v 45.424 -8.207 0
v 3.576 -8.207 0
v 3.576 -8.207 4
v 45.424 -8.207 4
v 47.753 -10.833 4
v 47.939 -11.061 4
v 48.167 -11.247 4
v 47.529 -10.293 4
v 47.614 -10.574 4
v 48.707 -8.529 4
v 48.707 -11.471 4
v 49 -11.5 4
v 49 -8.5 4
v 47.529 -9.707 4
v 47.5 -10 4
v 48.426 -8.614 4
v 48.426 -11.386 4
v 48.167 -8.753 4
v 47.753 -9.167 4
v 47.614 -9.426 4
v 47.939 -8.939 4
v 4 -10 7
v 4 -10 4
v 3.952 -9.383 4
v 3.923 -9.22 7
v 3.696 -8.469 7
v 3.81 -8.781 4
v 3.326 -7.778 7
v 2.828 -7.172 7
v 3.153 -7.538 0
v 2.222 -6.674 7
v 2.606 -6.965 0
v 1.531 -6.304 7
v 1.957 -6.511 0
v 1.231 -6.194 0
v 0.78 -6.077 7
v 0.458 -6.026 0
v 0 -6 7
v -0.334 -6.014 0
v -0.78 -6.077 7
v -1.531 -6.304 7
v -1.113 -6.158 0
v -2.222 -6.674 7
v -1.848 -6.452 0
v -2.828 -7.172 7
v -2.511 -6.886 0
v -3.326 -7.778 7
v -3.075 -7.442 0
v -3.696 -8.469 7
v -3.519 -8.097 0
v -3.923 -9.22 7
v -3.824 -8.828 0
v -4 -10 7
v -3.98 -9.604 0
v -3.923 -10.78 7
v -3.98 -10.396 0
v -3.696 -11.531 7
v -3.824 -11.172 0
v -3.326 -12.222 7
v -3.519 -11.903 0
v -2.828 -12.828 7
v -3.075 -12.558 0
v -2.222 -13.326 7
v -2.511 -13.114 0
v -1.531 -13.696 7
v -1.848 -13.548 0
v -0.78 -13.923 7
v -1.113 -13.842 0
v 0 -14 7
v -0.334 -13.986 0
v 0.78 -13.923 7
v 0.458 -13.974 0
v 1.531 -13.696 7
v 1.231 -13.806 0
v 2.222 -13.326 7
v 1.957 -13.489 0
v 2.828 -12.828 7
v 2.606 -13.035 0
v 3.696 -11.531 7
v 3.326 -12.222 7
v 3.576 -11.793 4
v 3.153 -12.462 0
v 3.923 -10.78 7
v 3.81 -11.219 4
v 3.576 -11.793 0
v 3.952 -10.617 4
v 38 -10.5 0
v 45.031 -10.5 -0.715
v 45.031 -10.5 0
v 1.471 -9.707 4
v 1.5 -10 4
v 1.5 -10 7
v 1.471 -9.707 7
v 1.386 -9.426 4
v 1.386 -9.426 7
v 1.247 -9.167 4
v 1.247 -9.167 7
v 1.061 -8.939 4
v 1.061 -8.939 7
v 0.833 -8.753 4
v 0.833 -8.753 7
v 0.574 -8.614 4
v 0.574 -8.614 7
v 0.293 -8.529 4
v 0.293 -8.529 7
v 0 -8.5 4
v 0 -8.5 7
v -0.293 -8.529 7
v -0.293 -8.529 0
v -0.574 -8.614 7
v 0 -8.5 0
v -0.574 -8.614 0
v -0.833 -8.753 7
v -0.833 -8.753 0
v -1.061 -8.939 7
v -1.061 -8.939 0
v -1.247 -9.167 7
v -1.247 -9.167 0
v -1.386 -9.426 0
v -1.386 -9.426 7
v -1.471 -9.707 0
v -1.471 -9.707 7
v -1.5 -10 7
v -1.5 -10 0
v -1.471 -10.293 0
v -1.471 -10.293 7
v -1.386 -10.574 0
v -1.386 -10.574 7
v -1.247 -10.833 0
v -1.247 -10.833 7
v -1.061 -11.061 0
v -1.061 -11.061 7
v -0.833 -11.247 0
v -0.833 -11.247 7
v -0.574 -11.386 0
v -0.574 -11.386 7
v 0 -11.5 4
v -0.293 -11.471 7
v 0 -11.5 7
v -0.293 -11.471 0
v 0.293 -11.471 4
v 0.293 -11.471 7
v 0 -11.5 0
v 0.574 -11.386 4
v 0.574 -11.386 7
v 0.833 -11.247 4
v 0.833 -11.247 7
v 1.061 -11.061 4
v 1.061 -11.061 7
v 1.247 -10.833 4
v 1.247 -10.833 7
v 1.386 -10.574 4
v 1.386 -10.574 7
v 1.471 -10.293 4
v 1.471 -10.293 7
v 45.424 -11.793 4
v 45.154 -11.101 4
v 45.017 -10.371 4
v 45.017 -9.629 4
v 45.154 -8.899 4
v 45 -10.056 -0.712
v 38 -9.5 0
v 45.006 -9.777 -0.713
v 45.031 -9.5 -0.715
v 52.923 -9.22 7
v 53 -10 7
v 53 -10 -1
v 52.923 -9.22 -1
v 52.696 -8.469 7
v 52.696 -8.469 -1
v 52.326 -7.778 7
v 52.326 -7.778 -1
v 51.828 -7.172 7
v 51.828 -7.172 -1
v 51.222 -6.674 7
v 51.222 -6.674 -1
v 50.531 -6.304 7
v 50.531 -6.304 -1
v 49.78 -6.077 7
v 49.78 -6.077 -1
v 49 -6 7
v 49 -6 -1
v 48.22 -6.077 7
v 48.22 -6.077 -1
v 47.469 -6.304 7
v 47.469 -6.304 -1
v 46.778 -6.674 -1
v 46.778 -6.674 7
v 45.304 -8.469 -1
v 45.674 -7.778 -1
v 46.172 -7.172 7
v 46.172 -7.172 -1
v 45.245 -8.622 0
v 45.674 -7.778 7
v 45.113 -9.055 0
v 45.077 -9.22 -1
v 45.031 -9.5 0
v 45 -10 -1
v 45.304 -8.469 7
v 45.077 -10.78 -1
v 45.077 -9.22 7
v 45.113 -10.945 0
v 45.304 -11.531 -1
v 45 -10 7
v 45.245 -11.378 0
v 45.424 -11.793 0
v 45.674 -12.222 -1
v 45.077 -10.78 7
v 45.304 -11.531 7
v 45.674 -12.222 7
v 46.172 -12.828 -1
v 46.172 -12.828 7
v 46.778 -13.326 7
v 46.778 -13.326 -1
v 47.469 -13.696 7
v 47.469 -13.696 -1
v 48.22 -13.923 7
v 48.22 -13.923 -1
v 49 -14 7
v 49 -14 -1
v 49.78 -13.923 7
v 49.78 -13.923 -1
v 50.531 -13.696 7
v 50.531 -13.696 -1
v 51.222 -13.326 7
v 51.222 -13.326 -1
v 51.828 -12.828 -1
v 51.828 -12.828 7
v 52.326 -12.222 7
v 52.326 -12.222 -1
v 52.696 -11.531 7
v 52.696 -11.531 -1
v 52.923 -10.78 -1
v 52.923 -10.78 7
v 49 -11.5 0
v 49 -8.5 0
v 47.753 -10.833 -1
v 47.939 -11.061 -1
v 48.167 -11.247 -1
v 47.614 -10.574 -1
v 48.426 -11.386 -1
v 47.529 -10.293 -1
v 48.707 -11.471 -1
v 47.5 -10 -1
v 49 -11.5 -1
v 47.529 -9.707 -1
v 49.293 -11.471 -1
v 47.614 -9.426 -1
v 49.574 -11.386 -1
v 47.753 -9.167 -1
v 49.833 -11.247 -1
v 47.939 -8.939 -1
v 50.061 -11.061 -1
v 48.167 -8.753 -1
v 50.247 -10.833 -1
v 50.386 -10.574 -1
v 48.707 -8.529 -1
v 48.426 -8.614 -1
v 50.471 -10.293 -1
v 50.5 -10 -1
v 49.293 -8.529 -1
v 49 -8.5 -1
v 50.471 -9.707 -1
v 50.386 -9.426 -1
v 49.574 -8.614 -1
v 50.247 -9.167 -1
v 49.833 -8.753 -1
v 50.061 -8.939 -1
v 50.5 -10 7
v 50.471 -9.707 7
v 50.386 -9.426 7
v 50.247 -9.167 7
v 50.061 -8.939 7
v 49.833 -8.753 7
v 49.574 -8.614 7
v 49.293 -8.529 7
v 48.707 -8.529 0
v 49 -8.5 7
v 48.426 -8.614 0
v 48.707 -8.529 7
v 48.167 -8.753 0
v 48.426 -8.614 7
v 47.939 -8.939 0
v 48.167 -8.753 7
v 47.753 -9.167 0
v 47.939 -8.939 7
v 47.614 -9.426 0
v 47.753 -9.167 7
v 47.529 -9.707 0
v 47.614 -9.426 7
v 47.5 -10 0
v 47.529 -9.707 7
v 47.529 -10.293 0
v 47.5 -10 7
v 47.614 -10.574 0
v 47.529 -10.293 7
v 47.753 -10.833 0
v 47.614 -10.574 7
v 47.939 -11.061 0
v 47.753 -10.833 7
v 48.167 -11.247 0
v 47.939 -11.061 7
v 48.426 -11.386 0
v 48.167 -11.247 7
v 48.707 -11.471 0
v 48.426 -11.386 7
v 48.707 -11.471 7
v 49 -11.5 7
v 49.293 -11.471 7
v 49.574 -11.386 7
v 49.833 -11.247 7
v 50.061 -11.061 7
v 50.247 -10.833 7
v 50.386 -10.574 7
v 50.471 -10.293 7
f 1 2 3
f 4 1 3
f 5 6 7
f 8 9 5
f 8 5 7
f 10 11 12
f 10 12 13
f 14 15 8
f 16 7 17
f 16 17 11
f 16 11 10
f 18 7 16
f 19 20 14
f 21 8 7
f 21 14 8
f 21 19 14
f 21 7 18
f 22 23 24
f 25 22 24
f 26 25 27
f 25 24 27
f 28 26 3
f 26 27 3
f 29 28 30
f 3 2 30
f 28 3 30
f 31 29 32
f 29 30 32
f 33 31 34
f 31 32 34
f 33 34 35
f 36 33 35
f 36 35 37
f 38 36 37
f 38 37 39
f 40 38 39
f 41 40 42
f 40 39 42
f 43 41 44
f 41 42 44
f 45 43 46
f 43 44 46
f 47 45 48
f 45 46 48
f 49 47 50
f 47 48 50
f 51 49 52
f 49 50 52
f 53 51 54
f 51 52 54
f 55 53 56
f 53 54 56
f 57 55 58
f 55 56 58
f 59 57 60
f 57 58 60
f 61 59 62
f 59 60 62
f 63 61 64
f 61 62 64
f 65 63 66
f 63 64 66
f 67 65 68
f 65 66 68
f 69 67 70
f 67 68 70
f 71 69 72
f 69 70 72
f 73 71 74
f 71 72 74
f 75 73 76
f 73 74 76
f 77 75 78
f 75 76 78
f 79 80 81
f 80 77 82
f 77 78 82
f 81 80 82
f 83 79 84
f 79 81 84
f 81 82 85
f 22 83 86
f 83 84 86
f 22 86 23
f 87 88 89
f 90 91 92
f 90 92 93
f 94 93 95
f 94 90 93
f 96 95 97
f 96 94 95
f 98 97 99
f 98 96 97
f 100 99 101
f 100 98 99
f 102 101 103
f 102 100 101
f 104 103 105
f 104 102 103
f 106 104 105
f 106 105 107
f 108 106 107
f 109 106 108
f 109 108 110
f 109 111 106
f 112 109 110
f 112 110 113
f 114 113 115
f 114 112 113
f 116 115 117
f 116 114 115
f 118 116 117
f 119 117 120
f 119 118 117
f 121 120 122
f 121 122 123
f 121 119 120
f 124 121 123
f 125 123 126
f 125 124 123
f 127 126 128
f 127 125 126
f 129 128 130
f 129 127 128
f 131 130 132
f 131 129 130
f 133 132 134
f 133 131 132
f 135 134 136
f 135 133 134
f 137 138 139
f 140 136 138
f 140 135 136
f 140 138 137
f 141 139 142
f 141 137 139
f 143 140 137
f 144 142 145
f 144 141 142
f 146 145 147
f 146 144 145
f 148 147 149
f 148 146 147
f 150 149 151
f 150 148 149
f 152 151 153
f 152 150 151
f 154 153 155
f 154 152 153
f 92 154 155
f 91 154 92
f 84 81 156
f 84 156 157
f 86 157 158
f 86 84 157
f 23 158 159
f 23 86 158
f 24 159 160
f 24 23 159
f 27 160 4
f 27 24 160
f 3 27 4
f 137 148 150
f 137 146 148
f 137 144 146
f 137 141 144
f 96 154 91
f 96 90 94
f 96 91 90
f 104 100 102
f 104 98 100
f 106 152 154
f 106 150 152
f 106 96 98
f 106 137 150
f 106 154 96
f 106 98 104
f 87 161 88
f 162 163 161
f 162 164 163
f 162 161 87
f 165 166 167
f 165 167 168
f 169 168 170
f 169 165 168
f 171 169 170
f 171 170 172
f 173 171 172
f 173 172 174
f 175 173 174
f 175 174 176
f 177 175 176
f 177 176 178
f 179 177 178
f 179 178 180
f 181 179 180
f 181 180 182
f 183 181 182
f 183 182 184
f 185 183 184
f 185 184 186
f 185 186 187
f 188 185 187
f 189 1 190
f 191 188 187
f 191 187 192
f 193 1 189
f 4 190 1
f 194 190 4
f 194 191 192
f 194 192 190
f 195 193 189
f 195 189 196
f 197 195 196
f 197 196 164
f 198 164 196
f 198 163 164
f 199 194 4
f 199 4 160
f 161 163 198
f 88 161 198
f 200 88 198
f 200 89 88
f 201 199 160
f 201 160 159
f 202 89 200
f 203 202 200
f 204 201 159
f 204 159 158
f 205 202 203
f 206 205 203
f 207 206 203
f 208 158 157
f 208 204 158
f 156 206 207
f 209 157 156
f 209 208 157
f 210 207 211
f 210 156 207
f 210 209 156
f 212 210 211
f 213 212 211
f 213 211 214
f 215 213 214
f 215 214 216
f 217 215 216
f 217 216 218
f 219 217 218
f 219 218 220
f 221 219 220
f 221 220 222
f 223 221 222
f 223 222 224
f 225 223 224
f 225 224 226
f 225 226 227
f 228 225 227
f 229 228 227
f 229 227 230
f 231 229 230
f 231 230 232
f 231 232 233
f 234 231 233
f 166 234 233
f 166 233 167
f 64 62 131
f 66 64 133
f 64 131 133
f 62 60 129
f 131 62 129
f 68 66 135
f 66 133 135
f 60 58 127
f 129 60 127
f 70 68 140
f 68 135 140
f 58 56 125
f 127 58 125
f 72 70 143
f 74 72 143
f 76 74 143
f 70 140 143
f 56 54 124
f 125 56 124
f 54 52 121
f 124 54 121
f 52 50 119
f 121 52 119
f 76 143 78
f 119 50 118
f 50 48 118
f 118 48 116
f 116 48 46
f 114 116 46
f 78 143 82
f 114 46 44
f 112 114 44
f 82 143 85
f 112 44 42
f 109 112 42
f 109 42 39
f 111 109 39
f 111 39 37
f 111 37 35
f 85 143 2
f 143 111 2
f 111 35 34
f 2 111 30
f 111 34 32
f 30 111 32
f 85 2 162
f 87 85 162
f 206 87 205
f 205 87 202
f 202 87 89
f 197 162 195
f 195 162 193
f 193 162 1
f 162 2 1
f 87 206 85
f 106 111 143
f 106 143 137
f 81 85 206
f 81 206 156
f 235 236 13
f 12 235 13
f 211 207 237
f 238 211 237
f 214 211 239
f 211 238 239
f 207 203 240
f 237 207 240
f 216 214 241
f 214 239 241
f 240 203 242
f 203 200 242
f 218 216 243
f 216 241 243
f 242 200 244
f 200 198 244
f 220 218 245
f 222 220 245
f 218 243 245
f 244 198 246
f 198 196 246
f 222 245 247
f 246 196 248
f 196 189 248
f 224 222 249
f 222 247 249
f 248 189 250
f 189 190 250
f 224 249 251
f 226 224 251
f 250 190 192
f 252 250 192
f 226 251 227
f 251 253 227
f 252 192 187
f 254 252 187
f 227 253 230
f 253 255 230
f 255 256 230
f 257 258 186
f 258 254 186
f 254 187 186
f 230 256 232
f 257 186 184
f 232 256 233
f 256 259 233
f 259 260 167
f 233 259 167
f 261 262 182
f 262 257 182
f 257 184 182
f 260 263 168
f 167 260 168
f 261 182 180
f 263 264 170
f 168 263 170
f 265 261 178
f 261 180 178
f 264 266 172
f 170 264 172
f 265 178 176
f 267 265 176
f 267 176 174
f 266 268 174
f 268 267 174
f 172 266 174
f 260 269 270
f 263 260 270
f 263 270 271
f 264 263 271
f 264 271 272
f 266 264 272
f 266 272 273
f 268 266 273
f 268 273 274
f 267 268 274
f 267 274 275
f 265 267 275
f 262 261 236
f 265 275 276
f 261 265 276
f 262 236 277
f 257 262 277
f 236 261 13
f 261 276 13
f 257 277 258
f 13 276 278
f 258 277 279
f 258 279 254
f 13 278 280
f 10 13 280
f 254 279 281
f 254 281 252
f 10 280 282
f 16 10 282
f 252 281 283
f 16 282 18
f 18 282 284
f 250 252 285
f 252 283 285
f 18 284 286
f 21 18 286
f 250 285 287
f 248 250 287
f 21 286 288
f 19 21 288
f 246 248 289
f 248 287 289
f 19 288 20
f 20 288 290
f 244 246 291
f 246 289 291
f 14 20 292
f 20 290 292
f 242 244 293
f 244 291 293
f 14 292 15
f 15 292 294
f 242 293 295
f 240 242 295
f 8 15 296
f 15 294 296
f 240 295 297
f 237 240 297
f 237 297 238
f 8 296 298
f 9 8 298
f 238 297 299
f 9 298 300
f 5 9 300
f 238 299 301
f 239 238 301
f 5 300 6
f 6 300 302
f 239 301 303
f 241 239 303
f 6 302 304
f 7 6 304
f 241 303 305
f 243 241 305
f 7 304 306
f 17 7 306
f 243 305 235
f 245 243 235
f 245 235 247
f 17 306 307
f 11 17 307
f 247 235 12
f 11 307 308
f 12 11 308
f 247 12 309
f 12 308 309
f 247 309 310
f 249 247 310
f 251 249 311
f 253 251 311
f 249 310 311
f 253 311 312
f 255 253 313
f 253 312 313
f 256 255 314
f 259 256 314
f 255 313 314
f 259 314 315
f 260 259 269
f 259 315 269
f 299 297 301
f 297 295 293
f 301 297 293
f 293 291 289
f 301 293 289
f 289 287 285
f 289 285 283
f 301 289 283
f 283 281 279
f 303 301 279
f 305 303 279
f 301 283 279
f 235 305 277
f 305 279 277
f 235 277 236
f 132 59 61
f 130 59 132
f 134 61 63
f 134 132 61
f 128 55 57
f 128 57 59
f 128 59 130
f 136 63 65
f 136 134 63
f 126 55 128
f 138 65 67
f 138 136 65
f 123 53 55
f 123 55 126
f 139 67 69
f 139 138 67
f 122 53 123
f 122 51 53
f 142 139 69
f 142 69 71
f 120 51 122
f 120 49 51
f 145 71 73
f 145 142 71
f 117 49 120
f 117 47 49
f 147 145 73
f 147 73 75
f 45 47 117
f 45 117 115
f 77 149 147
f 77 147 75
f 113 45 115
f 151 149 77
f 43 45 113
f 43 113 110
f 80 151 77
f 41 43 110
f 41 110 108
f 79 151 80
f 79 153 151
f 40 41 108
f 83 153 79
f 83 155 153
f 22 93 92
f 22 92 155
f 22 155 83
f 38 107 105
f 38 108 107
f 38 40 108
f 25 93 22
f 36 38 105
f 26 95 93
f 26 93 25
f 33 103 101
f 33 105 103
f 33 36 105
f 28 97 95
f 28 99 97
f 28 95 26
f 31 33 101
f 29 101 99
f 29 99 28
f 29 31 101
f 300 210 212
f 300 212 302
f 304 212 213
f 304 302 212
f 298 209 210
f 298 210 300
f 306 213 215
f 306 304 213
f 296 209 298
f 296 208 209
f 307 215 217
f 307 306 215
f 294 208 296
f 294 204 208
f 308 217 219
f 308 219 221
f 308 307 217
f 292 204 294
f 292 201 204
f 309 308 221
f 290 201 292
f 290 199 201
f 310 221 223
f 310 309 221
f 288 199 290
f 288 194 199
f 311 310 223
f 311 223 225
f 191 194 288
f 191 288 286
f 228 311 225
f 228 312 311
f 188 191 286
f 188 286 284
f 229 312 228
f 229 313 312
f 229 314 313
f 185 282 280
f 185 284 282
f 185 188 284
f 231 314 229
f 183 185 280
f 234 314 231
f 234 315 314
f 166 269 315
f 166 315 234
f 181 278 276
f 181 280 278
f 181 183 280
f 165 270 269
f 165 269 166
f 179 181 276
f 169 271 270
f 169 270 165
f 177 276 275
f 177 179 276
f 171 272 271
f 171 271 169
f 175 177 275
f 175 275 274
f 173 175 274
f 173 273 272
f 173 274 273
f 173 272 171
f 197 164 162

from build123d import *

# Parameters (mm, degrees)
CROQUIS1_R              = 4
CROQUIS1_R_2            = 1.5
SALIENTE_EXTRUIR1_DEPTH = 7
CROQUIS3_W              = 4
CROQUIS3_H              = 3.585282108
SALIENTE_EXTRUIR2_DEPTH = 49
CROQUIS4_R              = 4
CROQUIS4_R_2            = 1.5
SALIENTE_EXTRUIR3_DEPTH = 8
NERVIO1_REACH           = 55.61
CROQUIS6_WALL_W         = 119.09857021
CROQUIS6_WALL_H         = 1


with BuildPart() as part:
    # Croquis1 → Saliente-Extruir1 (new body)
    with BuildSketch(Plane.XY):
        with Locations((0, -10)):
            Circle(CROQUIS1_R)
        with Locations((0, -10)):
            Circle(CROQUIS1_R_2, mode=Mode.SUBTRACT)
    extrude(amount=SALIENTE_EXTRUIR1_DEPTH)

    # Croquis3 → Saliente-Extruir2 (add)
    with BuildSketch(Plane.ZY):
        with Locations((2, -10)):
            Rectangle(CROQUIS3_W, CROQUIS3_H)
    extrude(amount=-SALIENTE_EXTRUIR2_DEPTH)

    # Croquis4 → Saliente-Extruir3 (add)
    with BuildSketch(Plane.XY.offset(7)):
        with Locations((49, -10)):
            Circle(CROQUIS4_R)
        with Locations((49, -10)):
            Circle(CROQUIS4_R_2, mode=Mode.SUBTRACT)
    extrude(amount=-SALIENTE_EXTRUIR3_DEPTH)

    # Croquis6 wall → Nervio1 (add, up to next)
    with BuildSketch(Plane(origin=(42.914213562, -10, -0.5), x_dir=(-0.994863752618, 0, 0.1012230889), z_dir=(-0.1012230889, 0, -0.994863752618)), mode=Mode.PRIVATE) as nervio1_sk1:
        Rectangle(CROQUIS6_WALL_W, CROQUIS6_WALL_H)
    nervio1_tool1 = extrude(nervio1_sk1.sketch, amount=-NERVIO1_REACH, mode=Mode.PRIVATE) - part.part
    add(nervio1_tool1.solids().sort_by_distance((42.914213562, -10, -0.5))[0])


solid = part.part
